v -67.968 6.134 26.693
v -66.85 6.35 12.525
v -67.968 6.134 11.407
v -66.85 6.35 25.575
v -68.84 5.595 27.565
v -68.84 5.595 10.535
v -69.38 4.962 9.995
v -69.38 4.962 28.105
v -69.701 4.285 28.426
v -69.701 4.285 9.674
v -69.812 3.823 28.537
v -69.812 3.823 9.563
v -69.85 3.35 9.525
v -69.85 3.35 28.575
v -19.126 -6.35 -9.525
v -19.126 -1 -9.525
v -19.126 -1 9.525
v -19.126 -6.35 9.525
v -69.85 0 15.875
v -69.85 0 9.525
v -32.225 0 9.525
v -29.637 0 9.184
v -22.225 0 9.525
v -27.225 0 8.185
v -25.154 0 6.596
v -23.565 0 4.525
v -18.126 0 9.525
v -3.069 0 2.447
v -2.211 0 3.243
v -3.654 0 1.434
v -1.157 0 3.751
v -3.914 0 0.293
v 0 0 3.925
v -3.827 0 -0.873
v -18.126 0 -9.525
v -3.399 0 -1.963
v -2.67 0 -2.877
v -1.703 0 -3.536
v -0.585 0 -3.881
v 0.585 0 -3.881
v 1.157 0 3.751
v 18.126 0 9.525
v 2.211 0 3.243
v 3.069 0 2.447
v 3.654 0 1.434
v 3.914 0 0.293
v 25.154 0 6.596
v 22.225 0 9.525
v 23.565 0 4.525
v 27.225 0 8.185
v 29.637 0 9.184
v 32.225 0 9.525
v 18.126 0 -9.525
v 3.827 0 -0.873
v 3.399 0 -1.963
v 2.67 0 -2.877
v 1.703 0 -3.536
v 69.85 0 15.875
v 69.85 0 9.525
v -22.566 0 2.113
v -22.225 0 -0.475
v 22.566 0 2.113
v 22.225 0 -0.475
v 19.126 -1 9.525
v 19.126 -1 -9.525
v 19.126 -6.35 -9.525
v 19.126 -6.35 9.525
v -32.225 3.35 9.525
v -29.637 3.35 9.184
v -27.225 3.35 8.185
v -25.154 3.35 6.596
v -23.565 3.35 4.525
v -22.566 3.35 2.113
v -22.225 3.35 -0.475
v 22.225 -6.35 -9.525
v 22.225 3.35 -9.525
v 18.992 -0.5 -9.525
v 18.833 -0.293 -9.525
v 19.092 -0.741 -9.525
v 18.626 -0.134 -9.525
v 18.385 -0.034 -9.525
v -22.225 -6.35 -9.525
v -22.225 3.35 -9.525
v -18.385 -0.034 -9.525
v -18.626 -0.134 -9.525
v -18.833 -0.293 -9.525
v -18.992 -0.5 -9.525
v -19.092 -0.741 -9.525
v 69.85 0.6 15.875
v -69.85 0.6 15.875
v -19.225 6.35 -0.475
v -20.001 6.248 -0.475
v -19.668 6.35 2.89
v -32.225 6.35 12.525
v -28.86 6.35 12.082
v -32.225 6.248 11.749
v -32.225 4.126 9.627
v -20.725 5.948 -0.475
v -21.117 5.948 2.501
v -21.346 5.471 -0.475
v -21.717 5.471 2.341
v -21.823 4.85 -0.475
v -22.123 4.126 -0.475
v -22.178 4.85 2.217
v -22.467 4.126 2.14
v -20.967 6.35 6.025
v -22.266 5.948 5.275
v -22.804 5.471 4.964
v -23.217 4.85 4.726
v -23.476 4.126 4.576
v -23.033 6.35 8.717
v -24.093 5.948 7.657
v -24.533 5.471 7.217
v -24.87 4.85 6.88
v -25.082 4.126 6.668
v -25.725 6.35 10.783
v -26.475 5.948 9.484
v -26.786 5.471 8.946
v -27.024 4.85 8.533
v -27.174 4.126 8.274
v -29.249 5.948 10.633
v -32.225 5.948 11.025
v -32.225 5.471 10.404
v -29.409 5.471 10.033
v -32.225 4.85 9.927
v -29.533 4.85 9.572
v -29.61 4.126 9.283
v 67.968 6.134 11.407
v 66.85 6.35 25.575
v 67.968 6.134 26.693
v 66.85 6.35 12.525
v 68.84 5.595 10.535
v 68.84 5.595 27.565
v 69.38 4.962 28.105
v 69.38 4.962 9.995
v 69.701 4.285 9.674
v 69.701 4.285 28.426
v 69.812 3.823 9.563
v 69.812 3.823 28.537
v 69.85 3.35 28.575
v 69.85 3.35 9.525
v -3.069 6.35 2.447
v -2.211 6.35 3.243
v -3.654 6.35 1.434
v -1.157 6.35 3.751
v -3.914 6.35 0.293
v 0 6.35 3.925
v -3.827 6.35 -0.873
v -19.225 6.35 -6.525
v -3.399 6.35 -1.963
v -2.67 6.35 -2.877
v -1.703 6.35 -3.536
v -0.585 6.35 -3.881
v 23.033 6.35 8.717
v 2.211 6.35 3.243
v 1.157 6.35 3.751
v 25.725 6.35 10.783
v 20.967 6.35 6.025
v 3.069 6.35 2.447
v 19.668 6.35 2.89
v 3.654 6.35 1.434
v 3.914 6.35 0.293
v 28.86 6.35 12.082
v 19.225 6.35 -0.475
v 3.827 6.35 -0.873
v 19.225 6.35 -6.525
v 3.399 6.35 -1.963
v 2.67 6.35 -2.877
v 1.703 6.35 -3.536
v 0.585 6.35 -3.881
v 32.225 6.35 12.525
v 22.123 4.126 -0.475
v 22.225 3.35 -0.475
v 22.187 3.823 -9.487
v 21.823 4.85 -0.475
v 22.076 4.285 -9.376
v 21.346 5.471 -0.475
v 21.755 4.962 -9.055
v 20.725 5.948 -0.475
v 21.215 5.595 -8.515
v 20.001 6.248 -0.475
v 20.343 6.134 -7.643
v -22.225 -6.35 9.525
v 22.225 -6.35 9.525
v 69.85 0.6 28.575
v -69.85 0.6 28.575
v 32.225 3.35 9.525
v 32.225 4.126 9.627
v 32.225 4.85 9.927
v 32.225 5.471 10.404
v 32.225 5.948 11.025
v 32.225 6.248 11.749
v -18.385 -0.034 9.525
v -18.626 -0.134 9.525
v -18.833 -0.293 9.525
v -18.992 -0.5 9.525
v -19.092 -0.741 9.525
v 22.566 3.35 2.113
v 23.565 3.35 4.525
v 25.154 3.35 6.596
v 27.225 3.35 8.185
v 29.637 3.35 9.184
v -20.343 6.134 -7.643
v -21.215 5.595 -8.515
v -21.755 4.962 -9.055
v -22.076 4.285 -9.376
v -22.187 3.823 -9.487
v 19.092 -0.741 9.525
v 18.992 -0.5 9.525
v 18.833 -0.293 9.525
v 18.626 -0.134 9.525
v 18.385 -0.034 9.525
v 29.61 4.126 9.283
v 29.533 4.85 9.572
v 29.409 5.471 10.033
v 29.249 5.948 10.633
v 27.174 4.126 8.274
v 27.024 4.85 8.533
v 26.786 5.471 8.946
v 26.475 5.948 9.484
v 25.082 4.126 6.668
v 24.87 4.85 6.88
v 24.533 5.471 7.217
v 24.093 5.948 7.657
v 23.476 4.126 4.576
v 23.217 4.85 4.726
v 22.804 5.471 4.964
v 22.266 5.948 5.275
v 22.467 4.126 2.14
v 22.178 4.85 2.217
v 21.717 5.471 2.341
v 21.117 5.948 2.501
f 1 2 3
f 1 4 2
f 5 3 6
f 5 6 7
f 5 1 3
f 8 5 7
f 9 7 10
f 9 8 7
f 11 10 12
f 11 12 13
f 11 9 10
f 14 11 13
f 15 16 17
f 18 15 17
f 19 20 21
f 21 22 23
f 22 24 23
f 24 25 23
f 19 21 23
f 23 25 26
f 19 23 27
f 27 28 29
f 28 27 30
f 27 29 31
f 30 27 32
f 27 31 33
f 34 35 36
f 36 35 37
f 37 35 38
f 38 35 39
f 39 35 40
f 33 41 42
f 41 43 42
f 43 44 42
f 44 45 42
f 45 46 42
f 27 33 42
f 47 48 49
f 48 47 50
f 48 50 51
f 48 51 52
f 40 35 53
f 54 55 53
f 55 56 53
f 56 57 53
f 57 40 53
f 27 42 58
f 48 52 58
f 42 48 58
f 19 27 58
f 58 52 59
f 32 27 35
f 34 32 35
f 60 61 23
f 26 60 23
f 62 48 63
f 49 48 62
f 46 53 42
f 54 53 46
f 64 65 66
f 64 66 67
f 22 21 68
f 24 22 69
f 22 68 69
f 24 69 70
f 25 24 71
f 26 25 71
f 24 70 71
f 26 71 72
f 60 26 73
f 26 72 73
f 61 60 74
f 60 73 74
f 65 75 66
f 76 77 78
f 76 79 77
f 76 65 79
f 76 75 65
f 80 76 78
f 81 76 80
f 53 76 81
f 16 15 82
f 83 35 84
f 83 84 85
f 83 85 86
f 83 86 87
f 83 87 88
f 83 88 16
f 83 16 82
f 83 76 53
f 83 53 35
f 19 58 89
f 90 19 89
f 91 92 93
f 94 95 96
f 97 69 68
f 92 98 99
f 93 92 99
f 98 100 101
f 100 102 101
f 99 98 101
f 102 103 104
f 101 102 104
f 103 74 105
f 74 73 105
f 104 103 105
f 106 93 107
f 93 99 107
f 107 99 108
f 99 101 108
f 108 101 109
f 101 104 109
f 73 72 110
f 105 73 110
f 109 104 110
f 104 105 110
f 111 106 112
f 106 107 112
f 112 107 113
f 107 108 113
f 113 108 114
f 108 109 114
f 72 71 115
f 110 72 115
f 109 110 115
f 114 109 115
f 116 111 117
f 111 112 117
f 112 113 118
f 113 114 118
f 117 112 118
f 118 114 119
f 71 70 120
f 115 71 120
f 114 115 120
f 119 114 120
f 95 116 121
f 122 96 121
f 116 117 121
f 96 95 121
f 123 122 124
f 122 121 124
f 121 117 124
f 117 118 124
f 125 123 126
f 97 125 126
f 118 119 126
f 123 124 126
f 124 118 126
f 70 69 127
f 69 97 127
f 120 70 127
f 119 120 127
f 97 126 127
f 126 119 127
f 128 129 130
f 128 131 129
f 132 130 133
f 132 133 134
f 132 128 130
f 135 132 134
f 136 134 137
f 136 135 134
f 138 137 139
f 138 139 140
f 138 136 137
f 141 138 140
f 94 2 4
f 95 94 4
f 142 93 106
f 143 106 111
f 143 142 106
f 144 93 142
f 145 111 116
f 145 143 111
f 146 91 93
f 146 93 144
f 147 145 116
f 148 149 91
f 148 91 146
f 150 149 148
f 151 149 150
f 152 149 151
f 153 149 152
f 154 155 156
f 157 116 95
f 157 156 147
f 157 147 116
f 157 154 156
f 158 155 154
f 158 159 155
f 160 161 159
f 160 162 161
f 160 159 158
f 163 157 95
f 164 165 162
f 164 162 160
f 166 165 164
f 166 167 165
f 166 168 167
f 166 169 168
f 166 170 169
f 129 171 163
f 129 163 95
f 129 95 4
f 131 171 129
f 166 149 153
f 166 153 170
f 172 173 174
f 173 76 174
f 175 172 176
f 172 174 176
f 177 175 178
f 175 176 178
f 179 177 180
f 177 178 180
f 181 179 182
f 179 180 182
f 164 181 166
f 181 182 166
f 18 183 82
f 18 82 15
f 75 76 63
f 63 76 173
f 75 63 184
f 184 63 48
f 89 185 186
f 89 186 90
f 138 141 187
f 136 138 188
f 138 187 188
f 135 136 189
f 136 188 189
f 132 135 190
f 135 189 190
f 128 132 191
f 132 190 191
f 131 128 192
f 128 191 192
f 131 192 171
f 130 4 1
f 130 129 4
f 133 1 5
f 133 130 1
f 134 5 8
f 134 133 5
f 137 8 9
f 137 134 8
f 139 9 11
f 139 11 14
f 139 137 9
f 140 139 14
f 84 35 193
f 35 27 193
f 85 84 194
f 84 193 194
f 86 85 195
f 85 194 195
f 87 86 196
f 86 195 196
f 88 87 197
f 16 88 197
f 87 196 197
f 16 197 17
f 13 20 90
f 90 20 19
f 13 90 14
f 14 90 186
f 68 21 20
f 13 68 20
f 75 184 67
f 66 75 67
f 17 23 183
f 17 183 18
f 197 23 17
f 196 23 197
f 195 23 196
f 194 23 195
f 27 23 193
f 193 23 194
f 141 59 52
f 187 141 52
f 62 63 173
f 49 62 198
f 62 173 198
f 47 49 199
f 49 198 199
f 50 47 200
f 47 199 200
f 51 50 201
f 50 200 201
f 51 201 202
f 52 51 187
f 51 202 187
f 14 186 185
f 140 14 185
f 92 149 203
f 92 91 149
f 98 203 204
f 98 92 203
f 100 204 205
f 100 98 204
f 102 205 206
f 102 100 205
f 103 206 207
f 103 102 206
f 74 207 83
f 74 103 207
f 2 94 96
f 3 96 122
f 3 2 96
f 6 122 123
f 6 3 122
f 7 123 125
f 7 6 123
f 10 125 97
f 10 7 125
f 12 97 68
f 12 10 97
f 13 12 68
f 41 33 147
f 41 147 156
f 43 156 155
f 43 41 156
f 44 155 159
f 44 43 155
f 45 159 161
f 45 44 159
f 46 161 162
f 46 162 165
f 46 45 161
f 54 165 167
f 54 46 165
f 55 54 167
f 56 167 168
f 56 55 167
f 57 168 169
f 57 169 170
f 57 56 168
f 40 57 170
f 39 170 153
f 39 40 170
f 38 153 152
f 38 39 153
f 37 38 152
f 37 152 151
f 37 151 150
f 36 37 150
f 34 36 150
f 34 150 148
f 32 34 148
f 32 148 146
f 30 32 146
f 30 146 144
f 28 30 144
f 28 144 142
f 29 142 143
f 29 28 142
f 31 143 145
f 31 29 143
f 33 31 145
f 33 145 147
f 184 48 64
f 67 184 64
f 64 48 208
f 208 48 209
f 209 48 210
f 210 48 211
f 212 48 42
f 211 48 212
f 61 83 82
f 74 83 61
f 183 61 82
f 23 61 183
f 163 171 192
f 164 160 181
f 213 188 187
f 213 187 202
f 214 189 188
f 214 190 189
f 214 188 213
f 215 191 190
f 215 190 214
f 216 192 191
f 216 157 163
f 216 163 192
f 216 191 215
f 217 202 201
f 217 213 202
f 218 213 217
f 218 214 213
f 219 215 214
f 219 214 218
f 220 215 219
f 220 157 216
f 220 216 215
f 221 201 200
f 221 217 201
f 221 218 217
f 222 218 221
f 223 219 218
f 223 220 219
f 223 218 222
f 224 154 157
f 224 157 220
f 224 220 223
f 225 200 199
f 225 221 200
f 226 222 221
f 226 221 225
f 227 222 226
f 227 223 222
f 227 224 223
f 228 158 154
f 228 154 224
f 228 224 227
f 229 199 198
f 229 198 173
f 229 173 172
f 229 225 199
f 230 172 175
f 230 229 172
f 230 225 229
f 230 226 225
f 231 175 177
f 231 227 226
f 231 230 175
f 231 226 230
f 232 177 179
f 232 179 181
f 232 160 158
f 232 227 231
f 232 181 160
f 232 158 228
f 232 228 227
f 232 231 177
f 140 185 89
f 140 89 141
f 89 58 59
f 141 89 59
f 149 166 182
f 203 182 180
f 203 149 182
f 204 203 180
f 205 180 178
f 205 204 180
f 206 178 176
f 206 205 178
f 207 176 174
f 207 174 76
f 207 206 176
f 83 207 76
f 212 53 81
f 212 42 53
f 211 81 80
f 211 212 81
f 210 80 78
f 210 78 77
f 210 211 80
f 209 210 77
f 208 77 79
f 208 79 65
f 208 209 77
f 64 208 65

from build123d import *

# Parameters (mm, degrees)
SKETCH1_R           = 8.89
SKETCH1_R_2         = 3.925
BOSS_EXTRUDE1_DEPTH = 6.35
SKETCH2_W           = 12.7
SKETCH2_H           = 0.6
CUT_EXTRUDE1_DEPTH  = 143.733819135
SKETCH3_W           = 3.0988
SKETCH3_H           = 19.05
BOSS_EXTRUDE2_DEPTH = 6.35
FILLET4_R           = 10
FILLET1_R           = 3
FILLET2_R           = 1


with BuildPart() as part:
    # Sketch1 → Boss-Extrude1 (new body)
    # profile 1 of 2: a face of its own
    with BuildSketch(Plane(origin=(0, 0, 0), x_dir=(1, 0, 0), z_dir=(0, 1, 0))):
        Polygon((-69.85, -28.575), (69.85, -28.575), (69.85, -9.525), (22.225, -9.525), (22.225, 9.525), (-22.225, 9.525), (-22.225, -9.525), (-69.85, -9.525), align=None)
        Circle(SKETCH1_R, mode=Mode.SUBTRACT)
    # profile 2 of 2: a face of its own
    with BuildSketch(Plane(origin=(0, 0, 0), x_dir=(1, 0, 0), z_dir=(0, 1, 0))):
        Circle(SKETCH1_R)
        with Locations(Location((0, 0, 0), (0, 0, 270))):
            Circle(SKETCH1_R_2, mode=Mode.SUBTRACT)
    extrude(amount=BOSS_EXTRUDE1_DEPTH)

    # Sketch2 → Cut-Extrude1 (cut, through all)
    with BuildSketch(Plane(origin=(69.85, 0, 0), x_dir=(0, 0, -1), z_dir=(1, 0, 0))):
        with Locations((-22.225, 0.3)):
            Rectangle(SKETCH2_W, SKETCH2_H)
    extrude(amount=-CUT_EXTRUDE1_DEPTH, mode=Mode.SUBTRACT)

    # Sketch3 → Boss-Extrude2 (add)
    with BuildSketch(Plane.XZ):
        with Locations((-20.6756, 0)):
            Rectangle(SKETCH3_W, SKETCH3_H)
    boss_extrude2 = extrude(amount=BOSS_EXTRUDE2_DEPTH)

    # Mirror1: Boss-Extrude2 across plane
    add(boss_extrude2.mirror(Plane(origin=(0, 0, 0), x_dir=(0, 0, 1), z_dir=(1, 0, 0))))

    # Fillet4
    fillet4_edges = [part.edges().sort_by_distance(p)[0] for p in [
        (-22.225, 3.175, 9.525),
        (22.225, 3.175, 9.525),
    ]]
    fillet(fillet4_edges, radius=FILLET4_R)

    # Fillet1
    fillet1_edges = [part.edges().sort_by_distance(p)[0] for p in [
        (0, 6.35, 28.575),
        (69.85, 6.35, 19.05),
        (0, 6.35, -9.525),
        (-51.0375, 6.35, 9.525),
        (-69.85, 6.35, 19.05),
        (22.225, 6.35, -5),
        (51.0375, 6.35, 9.525),
        (-22.225, 6.35, -5),
        (25.153932188, 6.35, 6.596067812),
        (-25.153932188, 6.35, 6.596067812),
    ]]
    fillet(fillet1_edges, radius=FILLET1_R)

    # Fillet2
    fillet2_edges = [part.edges().sort_by_distance(p)[0] for p in [
        (-19.1262, 0, 0),
        (19.1262, 0, 0),
    ]]
    fillet(fillet2_edges, radius=FILLET2_R)


solid = part.part
